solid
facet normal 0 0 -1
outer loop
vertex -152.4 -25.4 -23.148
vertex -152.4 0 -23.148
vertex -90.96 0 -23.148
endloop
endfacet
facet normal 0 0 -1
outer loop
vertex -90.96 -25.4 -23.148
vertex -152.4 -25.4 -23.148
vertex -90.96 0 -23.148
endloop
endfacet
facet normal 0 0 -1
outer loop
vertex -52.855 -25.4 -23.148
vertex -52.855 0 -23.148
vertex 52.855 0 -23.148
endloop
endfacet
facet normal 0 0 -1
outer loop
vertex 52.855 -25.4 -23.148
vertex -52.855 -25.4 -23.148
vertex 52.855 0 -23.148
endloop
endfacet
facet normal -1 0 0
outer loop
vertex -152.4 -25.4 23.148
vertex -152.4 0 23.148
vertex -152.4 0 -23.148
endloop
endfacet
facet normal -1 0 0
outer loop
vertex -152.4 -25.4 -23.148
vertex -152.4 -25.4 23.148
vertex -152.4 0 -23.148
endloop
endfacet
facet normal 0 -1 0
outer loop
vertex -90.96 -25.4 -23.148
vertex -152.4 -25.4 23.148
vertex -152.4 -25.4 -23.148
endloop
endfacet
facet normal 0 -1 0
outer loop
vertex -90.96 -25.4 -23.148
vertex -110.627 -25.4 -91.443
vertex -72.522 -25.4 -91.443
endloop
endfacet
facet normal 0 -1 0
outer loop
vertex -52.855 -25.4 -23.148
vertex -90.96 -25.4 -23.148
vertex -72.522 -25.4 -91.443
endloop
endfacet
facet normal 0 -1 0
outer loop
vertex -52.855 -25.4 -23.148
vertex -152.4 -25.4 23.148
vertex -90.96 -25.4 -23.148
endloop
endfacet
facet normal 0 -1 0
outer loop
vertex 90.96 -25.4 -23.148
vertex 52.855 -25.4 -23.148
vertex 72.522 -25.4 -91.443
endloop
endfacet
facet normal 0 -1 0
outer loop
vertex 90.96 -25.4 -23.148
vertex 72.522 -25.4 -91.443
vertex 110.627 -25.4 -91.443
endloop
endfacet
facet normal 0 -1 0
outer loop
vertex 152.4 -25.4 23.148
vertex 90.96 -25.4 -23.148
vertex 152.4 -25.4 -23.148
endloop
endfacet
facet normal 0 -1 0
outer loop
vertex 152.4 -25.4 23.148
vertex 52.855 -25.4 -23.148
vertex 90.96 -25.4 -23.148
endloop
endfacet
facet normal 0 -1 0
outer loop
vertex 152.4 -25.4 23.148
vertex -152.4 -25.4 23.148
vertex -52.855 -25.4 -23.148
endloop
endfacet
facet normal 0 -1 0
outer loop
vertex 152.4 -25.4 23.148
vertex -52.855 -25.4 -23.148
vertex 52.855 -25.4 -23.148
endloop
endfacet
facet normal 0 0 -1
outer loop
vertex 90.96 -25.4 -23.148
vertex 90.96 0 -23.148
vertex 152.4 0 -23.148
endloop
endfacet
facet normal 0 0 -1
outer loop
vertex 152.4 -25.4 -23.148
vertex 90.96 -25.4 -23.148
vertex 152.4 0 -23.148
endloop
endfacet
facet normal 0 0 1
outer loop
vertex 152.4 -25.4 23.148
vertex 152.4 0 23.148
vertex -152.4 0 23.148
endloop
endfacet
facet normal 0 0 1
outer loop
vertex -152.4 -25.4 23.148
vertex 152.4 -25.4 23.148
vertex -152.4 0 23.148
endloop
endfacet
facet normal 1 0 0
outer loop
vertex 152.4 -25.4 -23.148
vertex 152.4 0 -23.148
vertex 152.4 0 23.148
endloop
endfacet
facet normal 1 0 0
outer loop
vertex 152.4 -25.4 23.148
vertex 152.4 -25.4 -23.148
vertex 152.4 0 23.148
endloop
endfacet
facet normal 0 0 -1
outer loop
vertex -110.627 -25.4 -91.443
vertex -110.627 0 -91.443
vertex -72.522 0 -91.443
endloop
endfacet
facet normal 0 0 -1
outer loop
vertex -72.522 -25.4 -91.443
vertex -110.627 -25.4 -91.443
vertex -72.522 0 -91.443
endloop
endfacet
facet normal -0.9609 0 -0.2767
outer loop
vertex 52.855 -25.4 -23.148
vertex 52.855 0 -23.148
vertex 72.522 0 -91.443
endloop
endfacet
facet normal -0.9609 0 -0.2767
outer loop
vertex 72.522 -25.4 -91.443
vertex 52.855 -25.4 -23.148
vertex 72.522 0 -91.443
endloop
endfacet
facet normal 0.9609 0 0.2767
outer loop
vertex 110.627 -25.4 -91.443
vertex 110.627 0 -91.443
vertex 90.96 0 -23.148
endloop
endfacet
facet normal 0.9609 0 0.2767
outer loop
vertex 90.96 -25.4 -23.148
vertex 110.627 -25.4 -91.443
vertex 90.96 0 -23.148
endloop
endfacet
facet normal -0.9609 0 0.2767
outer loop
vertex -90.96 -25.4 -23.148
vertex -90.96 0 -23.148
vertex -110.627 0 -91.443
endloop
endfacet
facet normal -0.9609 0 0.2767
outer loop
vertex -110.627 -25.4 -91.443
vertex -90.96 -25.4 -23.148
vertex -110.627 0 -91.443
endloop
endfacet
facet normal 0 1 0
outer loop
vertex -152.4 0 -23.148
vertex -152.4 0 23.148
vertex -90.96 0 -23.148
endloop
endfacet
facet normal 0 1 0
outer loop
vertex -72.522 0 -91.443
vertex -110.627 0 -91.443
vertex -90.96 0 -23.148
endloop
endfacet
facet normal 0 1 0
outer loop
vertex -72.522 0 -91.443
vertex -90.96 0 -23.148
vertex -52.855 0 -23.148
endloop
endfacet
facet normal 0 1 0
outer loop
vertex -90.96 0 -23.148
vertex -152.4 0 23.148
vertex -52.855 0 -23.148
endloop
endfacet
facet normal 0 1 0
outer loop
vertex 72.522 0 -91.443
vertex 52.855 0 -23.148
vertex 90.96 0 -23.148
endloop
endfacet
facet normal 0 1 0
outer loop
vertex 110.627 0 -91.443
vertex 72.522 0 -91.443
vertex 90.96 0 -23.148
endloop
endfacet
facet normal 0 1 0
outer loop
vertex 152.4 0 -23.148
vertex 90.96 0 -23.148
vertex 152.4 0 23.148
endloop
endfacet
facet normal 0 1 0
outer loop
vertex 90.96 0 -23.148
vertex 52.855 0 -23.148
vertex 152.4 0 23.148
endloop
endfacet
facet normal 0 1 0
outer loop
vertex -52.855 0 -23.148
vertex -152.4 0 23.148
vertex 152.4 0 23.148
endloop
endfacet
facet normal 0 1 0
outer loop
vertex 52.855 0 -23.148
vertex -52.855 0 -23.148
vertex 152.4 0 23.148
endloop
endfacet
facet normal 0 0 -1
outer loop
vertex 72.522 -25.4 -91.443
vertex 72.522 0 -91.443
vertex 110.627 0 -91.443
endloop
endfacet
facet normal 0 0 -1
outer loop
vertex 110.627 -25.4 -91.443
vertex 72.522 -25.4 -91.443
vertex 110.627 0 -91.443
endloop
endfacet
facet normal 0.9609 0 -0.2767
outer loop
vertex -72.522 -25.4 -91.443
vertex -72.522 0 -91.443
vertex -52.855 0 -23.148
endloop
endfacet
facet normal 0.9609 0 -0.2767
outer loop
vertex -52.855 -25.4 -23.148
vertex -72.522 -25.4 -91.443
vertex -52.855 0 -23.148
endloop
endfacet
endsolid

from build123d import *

# Parameters (mm, degrees)
F1_DEPTH = 25.4
F2_DEPTH = 25.4


with BuildPart() as f1:
    # F0 (on Front) → F1 (new body)
    with BuildSketch(Plane.XZ):
        Polygon((152.4, -23.147755), (152.4, 23.147755), (-152.4, 23.147755), (-152.4, -23.147755), (-90.959854, -23.147755), (-52.855045, -23.147755), (52.855045, -23.147755), (90.959854, -23.147755), align=None)
    extrude(amount=F1_DEPTH)

    # F0 (on Front) → F2 (join)
    with BuildSketch(Plane.XZ):
        Polygon((110.626854, -91.442767), (90.959854, -23.147755), (52.855045, -23.147755), (72.522044, -91.442767), align=None)
        Polygon((-52.855045, -23.147755), (-90.959854, -23.147755), (-110.626854, -91.442767), (-72.522044, -91.442767), align=None)
    extrude(amount=F2_DEPTH)


solid = f1.part
